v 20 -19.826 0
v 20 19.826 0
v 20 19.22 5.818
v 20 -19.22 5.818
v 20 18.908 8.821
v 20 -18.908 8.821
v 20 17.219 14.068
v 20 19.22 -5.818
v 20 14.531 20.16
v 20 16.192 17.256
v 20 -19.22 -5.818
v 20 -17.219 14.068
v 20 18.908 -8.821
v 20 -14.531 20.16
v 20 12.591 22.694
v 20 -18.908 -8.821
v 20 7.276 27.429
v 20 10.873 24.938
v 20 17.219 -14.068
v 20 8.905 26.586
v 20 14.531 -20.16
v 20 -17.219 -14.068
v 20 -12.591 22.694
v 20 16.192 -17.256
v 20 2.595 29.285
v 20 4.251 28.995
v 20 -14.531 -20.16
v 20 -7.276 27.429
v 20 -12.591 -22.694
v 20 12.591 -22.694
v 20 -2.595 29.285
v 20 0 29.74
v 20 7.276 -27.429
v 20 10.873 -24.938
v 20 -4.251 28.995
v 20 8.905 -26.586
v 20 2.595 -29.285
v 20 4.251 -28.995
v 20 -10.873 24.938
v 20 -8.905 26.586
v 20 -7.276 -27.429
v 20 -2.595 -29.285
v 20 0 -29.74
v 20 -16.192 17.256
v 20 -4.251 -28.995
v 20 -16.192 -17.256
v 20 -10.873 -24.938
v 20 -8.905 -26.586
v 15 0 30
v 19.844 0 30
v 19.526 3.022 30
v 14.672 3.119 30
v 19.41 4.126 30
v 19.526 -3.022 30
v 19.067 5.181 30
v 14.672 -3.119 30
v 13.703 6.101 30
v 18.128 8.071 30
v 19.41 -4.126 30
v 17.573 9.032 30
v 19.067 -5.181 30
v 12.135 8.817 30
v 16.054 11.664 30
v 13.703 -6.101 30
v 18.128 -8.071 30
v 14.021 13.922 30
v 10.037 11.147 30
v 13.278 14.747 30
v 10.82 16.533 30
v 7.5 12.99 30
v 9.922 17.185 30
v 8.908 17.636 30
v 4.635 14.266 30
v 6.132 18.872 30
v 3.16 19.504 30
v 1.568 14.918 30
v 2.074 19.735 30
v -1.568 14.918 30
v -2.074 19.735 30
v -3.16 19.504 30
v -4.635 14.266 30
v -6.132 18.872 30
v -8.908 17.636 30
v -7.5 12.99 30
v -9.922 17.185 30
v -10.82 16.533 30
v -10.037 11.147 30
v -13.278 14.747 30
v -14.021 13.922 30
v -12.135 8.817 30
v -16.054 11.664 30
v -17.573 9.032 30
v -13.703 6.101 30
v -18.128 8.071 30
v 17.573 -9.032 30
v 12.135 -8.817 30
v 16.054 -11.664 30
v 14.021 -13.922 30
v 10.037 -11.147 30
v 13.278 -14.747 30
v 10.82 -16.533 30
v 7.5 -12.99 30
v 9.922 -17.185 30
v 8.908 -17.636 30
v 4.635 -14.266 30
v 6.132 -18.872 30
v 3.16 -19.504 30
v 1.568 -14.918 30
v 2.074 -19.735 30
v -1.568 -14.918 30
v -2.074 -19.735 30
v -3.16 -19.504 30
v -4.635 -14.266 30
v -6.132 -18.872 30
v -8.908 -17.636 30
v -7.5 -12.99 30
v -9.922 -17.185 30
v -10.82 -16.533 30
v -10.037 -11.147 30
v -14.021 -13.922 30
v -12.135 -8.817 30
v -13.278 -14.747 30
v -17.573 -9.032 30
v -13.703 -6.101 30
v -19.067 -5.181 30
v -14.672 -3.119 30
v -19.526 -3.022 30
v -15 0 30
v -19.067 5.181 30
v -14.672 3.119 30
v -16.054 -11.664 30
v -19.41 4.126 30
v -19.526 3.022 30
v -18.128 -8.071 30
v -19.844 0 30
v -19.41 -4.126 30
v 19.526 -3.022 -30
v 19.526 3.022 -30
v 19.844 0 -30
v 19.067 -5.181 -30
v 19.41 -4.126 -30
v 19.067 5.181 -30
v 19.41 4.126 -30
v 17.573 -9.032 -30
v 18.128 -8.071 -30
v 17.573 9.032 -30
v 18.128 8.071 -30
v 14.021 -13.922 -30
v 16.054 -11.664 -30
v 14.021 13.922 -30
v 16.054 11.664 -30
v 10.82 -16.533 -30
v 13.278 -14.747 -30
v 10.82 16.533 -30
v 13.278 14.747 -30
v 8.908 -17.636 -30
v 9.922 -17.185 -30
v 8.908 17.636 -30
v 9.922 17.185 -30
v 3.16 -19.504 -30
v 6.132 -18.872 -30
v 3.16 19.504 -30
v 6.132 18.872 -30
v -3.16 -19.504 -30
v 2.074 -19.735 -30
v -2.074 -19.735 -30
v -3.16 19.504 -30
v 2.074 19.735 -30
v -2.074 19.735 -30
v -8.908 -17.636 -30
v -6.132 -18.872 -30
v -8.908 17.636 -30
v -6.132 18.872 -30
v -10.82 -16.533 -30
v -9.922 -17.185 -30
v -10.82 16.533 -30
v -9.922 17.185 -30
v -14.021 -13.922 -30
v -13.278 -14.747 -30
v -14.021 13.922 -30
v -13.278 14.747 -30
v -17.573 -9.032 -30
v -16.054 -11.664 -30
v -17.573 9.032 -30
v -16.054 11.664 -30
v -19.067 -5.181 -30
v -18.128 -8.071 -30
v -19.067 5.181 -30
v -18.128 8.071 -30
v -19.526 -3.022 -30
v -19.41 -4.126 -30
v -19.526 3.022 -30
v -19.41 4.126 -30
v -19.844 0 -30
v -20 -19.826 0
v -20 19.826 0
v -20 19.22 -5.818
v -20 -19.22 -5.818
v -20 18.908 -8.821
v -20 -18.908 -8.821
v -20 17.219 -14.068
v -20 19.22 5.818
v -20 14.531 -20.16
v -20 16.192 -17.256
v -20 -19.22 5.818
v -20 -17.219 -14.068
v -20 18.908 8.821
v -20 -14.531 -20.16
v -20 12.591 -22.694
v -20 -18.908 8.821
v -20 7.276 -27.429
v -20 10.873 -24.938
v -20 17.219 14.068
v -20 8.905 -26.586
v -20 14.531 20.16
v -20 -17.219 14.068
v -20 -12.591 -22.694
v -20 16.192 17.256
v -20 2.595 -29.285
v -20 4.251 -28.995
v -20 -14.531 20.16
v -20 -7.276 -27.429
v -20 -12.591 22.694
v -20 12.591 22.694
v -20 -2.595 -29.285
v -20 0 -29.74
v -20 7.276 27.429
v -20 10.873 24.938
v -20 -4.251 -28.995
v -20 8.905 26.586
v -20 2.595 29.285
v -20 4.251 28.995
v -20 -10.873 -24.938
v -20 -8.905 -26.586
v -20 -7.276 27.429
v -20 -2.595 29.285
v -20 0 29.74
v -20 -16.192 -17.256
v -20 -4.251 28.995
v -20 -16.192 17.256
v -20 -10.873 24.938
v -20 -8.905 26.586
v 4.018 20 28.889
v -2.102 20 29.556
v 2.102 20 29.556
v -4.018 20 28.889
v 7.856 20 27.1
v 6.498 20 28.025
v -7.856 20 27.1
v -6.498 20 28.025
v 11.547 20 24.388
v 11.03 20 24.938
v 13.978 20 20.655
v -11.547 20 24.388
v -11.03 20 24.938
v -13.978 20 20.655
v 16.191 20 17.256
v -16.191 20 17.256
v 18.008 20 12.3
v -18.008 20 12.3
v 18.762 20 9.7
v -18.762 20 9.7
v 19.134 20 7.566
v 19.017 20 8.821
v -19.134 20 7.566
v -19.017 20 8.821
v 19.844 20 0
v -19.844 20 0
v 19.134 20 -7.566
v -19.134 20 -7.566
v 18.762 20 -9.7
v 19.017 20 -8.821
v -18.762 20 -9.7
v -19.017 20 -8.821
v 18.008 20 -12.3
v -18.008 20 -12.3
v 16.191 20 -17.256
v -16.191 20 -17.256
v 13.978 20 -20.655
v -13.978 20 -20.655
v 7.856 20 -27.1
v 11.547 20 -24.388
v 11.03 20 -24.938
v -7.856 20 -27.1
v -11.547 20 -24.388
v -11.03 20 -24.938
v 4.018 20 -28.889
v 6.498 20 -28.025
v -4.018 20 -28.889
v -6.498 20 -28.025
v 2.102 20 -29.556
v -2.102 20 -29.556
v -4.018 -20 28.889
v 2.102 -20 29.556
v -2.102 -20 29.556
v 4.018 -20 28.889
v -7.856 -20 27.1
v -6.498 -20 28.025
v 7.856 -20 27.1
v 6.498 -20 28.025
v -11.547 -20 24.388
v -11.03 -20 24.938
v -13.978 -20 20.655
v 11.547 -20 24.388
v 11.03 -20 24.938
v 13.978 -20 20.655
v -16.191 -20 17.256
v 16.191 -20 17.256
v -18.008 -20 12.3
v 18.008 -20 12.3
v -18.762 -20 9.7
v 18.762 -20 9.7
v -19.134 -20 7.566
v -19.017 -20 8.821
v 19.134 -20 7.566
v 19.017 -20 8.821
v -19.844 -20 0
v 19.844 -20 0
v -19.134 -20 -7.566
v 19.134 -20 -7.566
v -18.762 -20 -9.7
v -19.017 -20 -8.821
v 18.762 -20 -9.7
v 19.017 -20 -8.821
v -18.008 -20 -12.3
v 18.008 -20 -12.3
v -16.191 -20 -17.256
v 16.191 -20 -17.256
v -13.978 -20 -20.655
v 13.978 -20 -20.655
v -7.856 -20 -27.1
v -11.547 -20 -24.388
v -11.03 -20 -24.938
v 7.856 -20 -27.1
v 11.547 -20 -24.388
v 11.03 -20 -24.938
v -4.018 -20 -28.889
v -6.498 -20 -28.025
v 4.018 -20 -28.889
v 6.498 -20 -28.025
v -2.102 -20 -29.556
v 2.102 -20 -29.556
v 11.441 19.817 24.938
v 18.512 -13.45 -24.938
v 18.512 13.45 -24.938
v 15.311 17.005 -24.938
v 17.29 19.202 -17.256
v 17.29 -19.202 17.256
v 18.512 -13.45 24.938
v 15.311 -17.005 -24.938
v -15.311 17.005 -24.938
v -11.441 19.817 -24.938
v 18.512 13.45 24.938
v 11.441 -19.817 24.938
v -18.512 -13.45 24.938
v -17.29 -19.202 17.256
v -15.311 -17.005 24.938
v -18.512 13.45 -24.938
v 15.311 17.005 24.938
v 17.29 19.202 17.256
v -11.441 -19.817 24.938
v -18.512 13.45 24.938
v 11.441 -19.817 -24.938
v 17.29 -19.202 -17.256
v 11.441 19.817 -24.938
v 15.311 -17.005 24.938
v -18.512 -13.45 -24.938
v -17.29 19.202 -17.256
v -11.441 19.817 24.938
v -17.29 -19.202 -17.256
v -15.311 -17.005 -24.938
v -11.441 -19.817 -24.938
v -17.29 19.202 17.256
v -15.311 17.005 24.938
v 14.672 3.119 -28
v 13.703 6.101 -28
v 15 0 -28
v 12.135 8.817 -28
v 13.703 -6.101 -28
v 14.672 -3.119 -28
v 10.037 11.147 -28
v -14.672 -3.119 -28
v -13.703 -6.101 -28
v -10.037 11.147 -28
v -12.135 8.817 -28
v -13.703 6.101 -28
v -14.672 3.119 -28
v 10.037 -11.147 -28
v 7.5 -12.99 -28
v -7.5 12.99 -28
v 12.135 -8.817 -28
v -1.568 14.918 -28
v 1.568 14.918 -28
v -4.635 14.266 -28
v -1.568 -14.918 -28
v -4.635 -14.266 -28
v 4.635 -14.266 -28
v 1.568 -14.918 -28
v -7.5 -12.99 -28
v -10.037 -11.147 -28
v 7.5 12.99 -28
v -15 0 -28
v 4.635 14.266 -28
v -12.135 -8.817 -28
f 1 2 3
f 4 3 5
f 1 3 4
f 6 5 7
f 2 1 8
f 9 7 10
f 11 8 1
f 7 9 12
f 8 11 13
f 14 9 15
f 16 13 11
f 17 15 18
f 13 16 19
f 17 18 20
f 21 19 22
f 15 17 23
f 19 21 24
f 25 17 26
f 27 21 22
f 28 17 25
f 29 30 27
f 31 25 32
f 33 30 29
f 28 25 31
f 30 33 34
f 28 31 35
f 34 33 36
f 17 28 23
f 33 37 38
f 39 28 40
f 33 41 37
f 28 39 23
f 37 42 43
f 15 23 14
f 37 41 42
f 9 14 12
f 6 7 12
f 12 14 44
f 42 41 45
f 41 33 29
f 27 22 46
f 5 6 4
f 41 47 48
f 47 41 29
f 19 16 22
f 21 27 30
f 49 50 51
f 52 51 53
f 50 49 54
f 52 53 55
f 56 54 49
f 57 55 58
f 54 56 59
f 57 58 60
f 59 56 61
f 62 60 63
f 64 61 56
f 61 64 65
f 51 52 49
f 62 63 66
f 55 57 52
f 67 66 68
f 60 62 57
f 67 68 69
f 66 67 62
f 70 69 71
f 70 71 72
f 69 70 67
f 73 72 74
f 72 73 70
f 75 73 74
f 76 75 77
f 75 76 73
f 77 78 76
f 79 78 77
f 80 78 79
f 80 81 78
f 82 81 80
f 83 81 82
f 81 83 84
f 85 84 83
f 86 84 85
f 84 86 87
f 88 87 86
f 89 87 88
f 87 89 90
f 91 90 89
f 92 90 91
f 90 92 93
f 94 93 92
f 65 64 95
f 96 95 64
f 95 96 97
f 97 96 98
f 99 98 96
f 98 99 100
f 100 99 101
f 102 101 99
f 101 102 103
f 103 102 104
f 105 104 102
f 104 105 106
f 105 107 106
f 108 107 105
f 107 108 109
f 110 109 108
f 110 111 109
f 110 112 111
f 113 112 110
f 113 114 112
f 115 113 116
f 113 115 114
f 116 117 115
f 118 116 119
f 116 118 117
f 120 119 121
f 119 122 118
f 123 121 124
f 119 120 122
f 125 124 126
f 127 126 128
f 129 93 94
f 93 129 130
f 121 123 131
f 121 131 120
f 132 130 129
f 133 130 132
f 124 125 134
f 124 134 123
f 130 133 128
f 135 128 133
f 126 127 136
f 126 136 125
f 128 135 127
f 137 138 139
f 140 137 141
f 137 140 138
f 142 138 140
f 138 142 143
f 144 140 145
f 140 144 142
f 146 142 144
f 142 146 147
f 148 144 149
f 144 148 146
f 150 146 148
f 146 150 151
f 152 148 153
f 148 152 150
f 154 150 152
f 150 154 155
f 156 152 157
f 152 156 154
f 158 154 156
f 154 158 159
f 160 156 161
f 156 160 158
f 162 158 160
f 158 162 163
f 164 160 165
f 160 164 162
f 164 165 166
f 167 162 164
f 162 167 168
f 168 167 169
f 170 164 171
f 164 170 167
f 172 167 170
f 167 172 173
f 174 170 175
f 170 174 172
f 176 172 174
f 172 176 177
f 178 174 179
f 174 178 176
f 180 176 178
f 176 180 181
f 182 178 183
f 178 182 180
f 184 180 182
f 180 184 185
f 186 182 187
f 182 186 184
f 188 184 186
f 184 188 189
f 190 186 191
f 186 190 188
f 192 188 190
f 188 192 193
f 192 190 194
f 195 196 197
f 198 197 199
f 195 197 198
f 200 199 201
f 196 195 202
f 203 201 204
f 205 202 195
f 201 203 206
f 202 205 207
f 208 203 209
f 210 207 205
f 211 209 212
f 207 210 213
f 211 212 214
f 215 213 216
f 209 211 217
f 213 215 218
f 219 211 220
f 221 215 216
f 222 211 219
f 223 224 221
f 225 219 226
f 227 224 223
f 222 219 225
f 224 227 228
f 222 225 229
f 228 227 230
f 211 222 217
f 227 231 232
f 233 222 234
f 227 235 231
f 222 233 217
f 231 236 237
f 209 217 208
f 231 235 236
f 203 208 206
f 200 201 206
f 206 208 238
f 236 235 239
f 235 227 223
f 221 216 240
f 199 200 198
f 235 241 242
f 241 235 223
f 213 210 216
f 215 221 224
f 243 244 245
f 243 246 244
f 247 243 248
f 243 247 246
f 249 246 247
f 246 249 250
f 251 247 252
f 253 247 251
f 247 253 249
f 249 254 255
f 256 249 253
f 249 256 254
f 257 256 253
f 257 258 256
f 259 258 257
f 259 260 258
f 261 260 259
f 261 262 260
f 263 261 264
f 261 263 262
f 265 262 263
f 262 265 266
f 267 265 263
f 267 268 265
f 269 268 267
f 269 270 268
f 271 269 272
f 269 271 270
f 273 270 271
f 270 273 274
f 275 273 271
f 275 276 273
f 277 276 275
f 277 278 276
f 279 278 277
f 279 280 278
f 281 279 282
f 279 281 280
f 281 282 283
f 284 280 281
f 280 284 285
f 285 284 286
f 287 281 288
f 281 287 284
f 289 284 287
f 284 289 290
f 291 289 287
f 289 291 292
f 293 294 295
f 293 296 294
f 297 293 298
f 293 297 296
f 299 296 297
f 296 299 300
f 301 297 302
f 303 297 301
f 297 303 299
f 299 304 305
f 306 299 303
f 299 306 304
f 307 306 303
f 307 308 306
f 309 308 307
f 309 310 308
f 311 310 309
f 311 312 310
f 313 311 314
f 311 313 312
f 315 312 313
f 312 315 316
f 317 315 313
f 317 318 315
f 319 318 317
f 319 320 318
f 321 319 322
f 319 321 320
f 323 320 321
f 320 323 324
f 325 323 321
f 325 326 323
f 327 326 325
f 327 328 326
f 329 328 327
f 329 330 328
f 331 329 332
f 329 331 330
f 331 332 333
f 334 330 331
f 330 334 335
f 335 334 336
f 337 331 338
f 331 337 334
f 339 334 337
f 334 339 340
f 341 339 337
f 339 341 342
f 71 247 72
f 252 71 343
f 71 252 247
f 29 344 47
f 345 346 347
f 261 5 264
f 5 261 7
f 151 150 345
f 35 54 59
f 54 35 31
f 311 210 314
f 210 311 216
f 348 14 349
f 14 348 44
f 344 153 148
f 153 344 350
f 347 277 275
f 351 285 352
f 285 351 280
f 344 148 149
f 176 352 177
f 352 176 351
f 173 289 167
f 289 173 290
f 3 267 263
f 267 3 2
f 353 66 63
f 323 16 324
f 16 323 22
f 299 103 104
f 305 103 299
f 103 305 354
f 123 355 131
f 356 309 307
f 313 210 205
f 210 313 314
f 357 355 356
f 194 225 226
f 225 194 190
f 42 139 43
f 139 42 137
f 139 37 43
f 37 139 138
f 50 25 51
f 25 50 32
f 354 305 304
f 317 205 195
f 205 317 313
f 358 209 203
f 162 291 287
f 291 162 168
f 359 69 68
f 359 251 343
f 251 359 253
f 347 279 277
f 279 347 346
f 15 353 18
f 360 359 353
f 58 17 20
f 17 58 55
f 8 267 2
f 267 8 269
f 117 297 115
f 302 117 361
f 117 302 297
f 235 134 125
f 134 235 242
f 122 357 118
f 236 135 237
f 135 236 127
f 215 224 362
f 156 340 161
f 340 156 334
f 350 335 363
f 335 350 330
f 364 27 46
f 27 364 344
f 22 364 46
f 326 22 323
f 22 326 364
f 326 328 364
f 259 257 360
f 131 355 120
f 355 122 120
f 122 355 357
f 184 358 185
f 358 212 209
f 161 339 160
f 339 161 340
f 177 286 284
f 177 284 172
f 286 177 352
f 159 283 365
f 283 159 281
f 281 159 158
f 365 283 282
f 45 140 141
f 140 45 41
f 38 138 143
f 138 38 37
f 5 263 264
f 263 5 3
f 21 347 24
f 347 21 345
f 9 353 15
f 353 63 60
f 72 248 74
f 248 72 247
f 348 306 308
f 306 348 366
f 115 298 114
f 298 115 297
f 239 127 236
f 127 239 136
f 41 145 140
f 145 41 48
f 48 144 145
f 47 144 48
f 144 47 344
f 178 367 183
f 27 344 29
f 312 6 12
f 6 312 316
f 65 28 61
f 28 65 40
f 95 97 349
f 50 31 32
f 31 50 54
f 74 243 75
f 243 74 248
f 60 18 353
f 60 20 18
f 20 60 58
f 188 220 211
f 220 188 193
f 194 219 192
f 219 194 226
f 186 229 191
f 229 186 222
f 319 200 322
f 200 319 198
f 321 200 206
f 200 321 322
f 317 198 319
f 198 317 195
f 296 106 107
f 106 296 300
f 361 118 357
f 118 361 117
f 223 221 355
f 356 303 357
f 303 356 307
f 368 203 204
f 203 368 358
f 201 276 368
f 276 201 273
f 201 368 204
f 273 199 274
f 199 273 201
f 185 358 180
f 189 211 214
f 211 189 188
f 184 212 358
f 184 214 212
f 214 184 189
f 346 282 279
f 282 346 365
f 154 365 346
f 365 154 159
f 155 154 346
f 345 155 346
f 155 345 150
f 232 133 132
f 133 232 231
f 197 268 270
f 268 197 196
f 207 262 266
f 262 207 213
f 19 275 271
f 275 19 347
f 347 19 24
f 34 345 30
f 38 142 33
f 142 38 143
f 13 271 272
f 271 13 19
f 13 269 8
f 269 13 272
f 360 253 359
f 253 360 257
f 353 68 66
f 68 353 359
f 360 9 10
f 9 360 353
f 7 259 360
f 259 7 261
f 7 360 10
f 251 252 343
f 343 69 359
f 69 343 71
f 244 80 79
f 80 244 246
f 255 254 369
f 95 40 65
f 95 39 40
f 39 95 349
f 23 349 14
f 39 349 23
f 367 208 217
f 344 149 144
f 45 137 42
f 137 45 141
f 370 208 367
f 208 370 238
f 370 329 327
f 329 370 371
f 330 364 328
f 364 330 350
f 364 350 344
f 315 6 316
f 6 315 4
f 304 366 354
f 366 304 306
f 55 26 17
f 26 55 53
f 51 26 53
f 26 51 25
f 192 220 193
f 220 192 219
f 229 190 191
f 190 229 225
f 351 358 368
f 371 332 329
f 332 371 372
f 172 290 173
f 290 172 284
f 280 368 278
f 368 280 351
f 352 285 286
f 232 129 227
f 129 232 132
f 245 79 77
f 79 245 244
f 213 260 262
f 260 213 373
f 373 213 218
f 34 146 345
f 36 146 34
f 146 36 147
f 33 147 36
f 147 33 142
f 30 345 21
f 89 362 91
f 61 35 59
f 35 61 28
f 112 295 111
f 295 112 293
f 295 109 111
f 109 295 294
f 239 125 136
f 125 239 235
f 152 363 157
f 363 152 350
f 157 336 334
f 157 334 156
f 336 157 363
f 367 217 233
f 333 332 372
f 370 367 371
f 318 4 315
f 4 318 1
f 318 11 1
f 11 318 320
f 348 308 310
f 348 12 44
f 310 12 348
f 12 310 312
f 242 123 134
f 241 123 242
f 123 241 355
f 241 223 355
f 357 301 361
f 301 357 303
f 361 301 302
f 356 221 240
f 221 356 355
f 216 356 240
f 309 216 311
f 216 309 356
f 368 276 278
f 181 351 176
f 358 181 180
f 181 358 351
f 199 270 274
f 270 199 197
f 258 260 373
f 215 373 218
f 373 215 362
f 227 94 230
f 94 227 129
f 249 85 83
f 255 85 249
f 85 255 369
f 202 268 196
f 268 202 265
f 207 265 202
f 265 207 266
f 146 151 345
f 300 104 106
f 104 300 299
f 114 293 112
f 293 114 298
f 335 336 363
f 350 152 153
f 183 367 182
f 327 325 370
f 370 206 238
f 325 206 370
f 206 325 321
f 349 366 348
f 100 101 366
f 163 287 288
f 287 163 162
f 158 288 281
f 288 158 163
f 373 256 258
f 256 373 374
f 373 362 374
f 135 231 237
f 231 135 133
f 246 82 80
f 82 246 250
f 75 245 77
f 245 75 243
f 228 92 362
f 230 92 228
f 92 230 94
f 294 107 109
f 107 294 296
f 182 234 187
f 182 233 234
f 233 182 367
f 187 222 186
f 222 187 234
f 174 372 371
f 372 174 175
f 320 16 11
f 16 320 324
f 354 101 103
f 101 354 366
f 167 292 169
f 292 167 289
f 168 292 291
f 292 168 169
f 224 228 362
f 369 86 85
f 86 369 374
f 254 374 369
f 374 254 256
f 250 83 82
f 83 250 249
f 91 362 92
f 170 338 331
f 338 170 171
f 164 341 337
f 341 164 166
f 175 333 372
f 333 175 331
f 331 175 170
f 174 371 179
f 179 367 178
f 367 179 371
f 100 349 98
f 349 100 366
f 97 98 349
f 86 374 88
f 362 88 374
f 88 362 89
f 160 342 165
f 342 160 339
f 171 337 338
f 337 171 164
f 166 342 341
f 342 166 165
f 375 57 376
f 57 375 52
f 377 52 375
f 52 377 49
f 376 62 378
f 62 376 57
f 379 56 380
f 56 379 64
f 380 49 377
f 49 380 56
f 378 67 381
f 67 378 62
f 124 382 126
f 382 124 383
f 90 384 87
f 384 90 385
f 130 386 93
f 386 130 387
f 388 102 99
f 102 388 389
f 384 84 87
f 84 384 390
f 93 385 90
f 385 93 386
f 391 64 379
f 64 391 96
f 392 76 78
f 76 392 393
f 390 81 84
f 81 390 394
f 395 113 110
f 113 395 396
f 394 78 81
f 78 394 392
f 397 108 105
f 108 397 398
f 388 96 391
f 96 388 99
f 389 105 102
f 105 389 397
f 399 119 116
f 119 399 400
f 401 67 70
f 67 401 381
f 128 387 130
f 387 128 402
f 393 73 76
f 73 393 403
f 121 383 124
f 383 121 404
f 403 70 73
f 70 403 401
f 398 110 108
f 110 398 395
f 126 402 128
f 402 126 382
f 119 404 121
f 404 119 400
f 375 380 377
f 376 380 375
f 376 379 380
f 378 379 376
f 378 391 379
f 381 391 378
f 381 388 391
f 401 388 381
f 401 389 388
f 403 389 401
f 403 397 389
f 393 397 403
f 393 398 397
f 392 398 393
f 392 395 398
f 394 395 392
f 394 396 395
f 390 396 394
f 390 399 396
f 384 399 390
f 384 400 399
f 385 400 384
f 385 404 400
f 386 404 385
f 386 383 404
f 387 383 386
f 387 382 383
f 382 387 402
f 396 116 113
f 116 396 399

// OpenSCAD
/* ****** ****** */
/*
Let's draw a bit more
*/
/* ****** ****** */

width=40;
height=60;
bottom_thickness=2;
wall_thickness=5;

difference()
{
  intersection()
  {
    cube([width,width,height], center=true);
    scale([1,1,height/width]) // so that Z=1 is now...
    sphere(width/2 * sqrt(2)); // close to the cuboid edges
  }
  translate([0,0,-height/2+bottom_thickness])
  cylinder(r=width/2-wall_thickness,h=height+0.1);
}

/* ****** ****** */

/* end of [test03.scad] */
